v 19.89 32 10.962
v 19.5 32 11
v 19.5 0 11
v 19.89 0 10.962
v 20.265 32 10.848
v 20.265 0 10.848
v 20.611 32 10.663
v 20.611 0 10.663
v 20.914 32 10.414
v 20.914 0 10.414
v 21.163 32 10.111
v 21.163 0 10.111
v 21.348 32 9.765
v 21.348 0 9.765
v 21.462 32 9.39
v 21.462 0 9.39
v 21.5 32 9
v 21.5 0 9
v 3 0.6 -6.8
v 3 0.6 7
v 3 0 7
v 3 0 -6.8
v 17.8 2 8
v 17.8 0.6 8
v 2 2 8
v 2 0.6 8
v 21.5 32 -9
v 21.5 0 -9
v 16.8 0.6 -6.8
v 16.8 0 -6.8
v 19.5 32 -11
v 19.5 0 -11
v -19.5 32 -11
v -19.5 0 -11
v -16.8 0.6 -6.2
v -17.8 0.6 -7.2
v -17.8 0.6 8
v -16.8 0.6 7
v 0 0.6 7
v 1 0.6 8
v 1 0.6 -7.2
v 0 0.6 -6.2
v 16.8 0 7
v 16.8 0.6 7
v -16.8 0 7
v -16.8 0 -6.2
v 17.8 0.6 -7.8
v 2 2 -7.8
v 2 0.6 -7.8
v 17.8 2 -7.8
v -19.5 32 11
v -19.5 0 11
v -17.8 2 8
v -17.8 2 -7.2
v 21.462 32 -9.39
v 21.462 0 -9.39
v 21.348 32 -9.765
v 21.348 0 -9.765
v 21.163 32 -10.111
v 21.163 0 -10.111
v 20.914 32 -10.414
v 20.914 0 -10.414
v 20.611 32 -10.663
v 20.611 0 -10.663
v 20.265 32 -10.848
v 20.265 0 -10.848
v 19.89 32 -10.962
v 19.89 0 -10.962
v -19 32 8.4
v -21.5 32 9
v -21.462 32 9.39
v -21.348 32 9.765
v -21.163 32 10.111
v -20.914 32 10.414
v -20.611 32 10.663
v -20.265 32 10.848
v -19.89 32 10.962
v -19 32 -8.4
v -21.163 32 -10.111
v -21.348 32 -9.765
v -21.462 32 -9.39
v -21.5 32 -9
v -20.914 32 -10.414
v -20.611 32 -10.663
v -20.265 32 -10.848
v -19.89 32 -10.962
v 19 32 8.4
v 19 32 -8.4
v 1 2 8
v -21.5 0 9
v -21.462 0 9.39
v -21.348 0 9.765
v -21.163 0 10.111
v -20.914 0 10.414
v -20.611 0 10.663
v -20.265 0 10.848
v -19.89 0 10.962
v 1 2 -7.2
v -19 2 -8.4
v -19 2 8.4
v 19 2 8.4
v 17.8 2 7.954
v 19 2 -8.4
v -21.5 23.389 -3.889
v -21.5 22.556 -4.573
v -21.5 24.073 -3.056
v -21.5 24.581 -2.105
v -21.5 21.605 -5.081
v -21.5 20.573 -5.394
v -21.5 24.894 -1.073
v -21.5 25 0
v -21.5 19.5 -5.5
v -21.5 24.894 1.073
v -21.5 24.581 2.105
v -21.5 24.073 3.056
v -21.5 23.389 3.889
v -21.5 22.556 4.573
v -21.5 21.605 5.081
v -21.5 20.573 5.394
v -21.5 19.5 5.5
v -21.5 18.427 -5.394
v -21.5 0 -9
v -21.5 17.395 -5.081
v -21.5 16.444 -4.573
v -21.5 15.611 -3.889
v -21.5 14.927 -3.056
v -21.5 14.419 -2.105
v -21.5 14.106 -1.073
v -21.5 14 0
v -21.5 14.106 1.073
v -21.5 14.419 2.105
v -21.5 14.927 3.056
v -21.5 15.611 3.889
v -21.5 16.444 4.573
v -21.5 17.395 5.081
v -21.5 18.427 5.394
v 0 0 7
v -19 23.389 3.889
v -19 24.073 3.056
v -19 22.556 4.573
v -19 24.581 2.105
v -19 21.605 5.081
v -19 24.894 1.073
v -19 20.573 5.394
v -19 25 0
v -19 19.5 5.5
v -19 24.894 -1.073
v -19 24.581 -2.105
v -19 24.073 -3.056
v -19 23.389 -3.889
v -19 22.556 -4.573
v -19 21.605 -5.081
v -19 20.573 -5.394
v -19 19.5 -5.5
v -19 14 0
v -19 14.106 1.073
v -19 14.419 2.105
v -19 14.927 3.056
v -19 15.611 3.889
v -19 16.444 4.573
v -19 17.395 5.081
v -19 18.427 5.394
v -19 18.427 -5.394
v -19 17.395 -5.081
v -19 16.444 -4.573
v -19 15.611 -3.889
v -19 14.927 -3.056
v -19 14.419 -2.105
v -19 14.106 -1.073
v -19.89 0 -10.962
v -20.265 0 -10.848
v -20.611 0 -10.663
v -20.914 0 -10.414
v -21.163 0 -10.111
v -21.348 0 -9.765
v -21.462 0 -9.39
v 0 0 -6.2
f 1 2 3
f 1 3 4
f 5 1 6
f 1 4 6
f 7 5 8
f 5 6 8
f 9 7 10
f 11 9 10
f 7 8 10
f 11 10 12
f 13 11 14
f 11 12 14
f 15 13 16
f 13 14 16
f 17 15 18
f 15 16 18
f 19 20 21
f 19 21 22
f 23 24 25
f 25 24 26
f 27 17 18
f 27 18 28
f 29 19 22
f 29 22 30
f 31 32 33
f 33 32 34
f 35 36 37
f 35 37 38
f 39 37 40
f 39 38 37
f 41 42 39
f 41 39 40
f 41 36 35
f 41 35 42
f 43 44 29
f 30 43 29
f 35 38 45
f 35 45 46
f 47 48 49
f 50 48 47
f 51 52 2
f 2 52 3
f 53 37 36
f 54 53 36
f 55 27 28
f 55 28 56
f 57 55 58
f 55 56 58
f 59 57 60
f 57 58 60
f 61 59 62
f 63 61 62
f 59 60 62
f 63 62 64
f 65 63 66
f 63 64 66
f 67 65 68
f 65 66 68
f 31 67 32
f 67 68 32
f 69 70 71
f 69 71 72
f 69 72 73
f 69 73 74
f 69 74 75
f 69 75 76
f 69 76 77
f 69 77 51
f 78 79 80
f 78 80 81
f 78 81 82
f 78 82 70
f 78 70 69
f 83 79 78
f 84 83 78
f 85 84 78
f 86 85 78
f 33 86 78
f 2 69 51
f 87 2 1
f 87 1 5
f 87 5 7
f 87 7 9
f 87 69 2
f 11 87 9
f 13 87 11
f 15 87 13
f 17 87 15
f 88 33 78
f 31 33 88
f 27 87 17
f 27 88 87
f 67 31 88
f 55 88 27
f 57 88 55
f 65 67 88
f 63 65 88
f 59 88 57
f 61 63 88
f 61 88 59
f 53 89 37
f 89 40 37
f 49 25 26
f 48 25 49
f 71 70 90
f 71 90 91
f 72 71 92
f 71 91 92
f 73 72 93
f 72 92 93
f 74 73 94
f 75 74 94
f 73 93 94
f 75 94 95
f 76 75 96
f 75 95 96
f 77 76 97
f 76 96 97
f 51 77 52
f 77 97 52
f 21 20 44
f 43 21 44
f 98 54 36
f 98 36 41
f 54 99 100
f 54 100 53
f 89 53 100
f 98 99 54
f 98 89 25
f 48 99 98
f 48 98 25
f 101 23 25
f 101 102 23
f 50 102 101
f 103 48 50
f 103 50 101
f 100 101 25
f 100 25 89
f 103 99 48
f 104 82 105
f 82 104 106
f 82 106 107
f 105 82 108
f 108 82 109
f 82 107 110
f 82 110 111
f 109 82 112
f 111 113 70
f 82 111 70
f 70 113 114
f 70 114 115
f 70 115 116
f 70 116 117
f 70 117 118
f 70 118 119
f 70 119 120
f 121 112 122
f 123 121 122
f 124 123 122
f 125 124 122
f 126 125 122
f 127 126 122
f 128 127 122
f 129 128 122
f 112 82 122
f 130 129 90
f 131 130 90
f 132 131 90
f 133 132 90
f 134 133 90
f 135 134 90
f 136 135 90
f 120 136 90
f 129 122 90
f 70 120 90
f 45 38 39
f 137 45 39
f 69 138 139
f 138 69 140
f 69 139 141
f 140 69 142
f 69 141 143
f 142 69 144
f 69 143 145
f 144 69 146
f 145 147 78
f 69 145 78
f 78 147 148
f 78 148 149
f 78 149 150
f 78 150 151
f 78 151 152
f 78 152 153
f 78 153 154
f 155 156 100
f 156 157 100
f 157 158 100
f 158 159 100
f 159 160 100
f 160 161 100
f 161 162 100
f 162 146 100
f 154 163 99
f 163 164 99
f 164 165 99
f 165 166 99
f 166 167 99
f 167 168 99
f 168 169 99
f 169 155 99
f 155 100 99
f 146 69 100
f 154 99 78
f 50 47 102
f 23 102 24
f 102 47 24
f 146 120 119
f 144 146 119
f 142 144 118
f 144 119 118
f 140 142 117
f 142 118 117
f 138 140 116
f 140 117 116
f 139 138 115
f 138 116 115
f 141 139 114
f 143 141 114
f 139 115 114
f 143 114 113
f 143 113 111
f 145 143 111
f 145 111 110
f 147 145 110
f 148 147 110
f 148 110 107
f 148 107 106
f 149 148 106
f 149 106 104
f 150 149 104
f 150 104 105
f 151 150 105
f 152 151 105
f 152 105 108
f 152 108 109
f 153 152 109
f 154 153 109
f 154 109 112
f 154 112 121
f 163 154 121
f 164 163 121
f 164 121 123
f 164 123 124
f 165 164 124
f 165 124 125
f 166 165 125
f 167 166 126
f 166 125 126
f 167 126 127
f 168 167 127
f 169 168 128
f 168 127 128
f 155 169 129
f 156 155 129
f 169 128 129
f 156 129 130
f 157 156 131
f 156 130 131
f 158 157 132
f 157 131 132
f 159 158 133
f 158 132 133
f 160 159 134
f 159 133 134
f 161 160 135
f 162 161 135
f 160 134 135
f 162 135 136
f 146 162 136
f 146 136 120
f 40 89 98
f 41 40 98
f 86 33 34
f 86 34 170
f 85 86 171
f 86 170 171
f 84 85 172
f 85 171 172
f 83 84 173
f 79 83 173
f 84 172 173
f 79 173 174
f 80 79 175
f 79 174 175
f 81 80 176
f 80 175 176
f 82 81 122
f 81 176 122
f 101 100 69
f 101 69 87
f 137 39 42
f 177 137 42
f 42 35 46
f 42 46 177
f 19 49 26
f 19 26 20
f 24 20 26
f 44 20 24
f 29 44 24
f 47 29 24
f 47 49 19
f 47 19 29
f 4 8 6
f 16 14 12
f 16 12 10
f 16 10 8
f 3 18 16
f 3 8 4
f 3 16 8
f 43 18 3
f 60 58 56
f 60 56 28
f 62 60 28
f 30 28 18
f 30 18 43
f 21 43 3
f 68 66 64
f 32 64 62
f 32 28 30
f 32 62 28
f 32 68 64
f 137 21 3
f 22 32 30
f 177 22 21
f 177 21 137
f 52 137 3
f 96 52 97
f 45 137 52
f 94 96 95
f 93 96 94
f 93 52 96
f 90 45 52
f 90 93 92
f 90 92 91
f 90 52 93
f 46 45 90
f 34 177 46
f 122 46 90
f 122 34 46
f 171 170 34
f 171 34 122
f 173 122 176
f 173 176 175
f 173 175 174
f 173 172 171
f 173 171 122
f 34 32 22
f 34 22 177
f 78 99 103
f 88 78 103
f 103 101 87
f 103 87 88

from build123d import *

# Parameters (mm, degrees)
BOSS_EXTRUDE1_DEPTH = 2
SKETCH2_W           = 18.8
SKETCH2_H           = 15.2
SKETCH2_W_2         = 15.8
SKETCH2_H_2         = 15.8
CUT_EXTRUDE1_DEPTH  = 1.4
SKETCH3_W           = 16.8
SKETCH3_H           = 13.2
SKETCH3_W_2         = 13.8
SKETCH3_H_2         = 13.8
CUT_EXTRUDE2_DEPTH  = 25.191114071
BOSS_EXTRUDE3_DEPTH = 30
FILLET1_R           = 10
SKETCH15_W          = 38
SKETCH15_H          = 16.8
CUT_EXTRUDE3_DEPTH  = 39.512984823
CUT_EXTRUDE4_REACH  = 56.717
SKETCH16_R          = 5.5


with BuildPart() as part:
    # Sketch1 → Boss-Extrude1 (new body)
    with BuildSketch(Plane(origin=(0, 0, 0), x_dir=(1, 0, 0), z_dir=(0, 1, 0))):
        with BuildLine():
            Line((19.5, -11), (-19.5, -11))
            ThreePointArc((-19.5, -11), (-20.914213562, -10.414213562), (-21.5, -9))
            Line((-21.5, -9), (-21.5, 9))
            ThreePointArc((-21.5, 9), (-20.914213562, 10.414213562), (-19.5, 11))
            Line((-19.5, 11), (19.5, 11))
            ThreePointArc((19.5, 11), (20.914213562, 10.414213562), (21.5, 9))
            Line((21.5, 9), (21.5, -9))
            ThreePointArc((21.5, -9), (20.914213562, -10.414213562), (19.5, -11))
        make_face()
    extrude(amount=BOSS_EXTRUDE1_DEPTH)

    # Sketch2 → Cut-Extrude1 (cut)
    with BuildSketch(Plane(origin=(0, 2, 0), x_dir=(1, 0, 0), z_dir=(0, 1, 0))):
        with Locations((-8.4, -0.4)):
            Rectangle(SKETCH2_W, SKETCH2_H)
        with Locations((9.9, -0.1)):
            Rectangle(SKETCH2_W_2, SKETCH2_H_2)
    extrude(amount=-CUT_EXTRUDE1_DEPTH, mode=Mode.SUBTRACT)

    # Sketch3 → Cut-Extrude2 (cut, through all)
    with BuildSketch(Plane(origin=(0, 0.6, 0), x_dir=(1, 0, 0), z_dir=(0, 1, 0))):
        with Locations((-8.4, -0.4)):
            Rectangle(SKETCH3_W, SKETCH3_H)
        with Locations((9.9, -0.1)):
            Rectangle(SKETCH3_W_2, SKETCH3_H_2)
    extrude(amount=-CUT_EXTRUDE2_DEPTH, mode=Mode.SUBTRACT)

    # Sketch13 → Boss-Extrude3 (add)
    with BuildSketch(Plane(origin=(0, 2, 0), x_dir=(1, 0, 0), z_dir=(0, 1, 0))):
        with BuildLine():
            ThreePointArc((-21.5, -9), (-20.914213562, -10.414213562), (-19.5, -11))
            Line((-19.5, -11), (19.5, -11))
            ThreePointArc((19.5, -11), (20.914213562, -10.414213562), (21.5, -9))
            Line((21.5, -9), (21.5, 9))
            ThreePointArc((21.5, 9), (20.914213562, 10.414213562), (19.5, 11))
            Line((19.5, 11), (-19.5, 11))
            ThreePointArc((-19.5, 11), (-20.914213562, 10.414213562), (-21.5, 9))
            Line((-21.5, 9), (-21.5, -9))
        make_face()
        with BuildLine():
            ThreePointArc((17.5, 8), (18.207106781, 7.707106781), (18.5, 7))
            Line((18.5, 7), (18.5, -7))
            ThreePointArc((18.5, -7), (18.306225775, -7.591607978), (17.8, -7.953939201))
            Line((17.8, -7.953939201), (17.8, -8))
            Line((17.8, -8), (-17.8, -8))
            Line((-17.8, -8), (-17.8, -7.953939201))
            ThreePointArc((-17.8, -7.953939201), (-18.306225775, -7.591607978), (-18.5, -7))
            Line((-18.5, -7), (-18.5, 7))
            ThreePointArc((-18.5, 7), (-18.207106781, 7.707106781), (-17.5, 8))
            Line((-17.5, 8), (17.5, 8))
        make_face(mode=Mode.SUBTRACT)
    extrude(amount=BOSS_EXTRUDE3_DEPTH)

    # Fillet1
    # the kernel refuses this fillet: 10 mm, written as the material it takes off along each edge
    with BuildSketch(Plane(origin=(17.8, 2, 7.953939201), x_dir=(0.906100611464274, 0, -0.42306226717123885), z_dir=(0, 1, 0))) as fillet1_piece_1:
        with BuildLine():
            CenterArc((1.580945974, -9.912835739), FILLET1_R, 97.570469618, 1.638937345)
            Line((-0.019486586, -0.041735718), (0, 0))
            ThreePointArc((0, 0), (0.131745498, -0.008716426), (0.263490996, 0))
        make_face()
    extrude(amount=30.658727489, mode=Mode.SUBTRACT)

    # Sketch15 → Cut-Extrude3 (cut, through all)
    with BuildSketch(Plane(origin=(0, 2, 0), x_dir=(1, 0, 0), z_dir=(0, 1, 0))):
        Rectangle(SKETCH15_W, SKETCH15_H)
    extrude(amount=CUT_EXTRUDE3_DEPTH, mode=Mode.SUBTRACT)

    # Sketch16 → Cut-Extrude4 (cut, up to next)
    with BuildSketch(Plane.ZY.offset(21.5), mode=Mode.PRIVATE) as cut_extrude4_sk1:
        with Locations((0, 19.5)):
            Circle(SKETCH16_R)
    cut_extrude4_tool1 = extrude(cut_extrude4_sk1.sketch, amount=-CUT_EXTRUDE4_REACH, mode=Mode.PRIVATE) & part.part
    add(cut_extrude4_tool1.solids().sort_by_distance((-21.5, 19.5, 0))[0], mode=Mode.SUBTRACT)


solid = part.part
